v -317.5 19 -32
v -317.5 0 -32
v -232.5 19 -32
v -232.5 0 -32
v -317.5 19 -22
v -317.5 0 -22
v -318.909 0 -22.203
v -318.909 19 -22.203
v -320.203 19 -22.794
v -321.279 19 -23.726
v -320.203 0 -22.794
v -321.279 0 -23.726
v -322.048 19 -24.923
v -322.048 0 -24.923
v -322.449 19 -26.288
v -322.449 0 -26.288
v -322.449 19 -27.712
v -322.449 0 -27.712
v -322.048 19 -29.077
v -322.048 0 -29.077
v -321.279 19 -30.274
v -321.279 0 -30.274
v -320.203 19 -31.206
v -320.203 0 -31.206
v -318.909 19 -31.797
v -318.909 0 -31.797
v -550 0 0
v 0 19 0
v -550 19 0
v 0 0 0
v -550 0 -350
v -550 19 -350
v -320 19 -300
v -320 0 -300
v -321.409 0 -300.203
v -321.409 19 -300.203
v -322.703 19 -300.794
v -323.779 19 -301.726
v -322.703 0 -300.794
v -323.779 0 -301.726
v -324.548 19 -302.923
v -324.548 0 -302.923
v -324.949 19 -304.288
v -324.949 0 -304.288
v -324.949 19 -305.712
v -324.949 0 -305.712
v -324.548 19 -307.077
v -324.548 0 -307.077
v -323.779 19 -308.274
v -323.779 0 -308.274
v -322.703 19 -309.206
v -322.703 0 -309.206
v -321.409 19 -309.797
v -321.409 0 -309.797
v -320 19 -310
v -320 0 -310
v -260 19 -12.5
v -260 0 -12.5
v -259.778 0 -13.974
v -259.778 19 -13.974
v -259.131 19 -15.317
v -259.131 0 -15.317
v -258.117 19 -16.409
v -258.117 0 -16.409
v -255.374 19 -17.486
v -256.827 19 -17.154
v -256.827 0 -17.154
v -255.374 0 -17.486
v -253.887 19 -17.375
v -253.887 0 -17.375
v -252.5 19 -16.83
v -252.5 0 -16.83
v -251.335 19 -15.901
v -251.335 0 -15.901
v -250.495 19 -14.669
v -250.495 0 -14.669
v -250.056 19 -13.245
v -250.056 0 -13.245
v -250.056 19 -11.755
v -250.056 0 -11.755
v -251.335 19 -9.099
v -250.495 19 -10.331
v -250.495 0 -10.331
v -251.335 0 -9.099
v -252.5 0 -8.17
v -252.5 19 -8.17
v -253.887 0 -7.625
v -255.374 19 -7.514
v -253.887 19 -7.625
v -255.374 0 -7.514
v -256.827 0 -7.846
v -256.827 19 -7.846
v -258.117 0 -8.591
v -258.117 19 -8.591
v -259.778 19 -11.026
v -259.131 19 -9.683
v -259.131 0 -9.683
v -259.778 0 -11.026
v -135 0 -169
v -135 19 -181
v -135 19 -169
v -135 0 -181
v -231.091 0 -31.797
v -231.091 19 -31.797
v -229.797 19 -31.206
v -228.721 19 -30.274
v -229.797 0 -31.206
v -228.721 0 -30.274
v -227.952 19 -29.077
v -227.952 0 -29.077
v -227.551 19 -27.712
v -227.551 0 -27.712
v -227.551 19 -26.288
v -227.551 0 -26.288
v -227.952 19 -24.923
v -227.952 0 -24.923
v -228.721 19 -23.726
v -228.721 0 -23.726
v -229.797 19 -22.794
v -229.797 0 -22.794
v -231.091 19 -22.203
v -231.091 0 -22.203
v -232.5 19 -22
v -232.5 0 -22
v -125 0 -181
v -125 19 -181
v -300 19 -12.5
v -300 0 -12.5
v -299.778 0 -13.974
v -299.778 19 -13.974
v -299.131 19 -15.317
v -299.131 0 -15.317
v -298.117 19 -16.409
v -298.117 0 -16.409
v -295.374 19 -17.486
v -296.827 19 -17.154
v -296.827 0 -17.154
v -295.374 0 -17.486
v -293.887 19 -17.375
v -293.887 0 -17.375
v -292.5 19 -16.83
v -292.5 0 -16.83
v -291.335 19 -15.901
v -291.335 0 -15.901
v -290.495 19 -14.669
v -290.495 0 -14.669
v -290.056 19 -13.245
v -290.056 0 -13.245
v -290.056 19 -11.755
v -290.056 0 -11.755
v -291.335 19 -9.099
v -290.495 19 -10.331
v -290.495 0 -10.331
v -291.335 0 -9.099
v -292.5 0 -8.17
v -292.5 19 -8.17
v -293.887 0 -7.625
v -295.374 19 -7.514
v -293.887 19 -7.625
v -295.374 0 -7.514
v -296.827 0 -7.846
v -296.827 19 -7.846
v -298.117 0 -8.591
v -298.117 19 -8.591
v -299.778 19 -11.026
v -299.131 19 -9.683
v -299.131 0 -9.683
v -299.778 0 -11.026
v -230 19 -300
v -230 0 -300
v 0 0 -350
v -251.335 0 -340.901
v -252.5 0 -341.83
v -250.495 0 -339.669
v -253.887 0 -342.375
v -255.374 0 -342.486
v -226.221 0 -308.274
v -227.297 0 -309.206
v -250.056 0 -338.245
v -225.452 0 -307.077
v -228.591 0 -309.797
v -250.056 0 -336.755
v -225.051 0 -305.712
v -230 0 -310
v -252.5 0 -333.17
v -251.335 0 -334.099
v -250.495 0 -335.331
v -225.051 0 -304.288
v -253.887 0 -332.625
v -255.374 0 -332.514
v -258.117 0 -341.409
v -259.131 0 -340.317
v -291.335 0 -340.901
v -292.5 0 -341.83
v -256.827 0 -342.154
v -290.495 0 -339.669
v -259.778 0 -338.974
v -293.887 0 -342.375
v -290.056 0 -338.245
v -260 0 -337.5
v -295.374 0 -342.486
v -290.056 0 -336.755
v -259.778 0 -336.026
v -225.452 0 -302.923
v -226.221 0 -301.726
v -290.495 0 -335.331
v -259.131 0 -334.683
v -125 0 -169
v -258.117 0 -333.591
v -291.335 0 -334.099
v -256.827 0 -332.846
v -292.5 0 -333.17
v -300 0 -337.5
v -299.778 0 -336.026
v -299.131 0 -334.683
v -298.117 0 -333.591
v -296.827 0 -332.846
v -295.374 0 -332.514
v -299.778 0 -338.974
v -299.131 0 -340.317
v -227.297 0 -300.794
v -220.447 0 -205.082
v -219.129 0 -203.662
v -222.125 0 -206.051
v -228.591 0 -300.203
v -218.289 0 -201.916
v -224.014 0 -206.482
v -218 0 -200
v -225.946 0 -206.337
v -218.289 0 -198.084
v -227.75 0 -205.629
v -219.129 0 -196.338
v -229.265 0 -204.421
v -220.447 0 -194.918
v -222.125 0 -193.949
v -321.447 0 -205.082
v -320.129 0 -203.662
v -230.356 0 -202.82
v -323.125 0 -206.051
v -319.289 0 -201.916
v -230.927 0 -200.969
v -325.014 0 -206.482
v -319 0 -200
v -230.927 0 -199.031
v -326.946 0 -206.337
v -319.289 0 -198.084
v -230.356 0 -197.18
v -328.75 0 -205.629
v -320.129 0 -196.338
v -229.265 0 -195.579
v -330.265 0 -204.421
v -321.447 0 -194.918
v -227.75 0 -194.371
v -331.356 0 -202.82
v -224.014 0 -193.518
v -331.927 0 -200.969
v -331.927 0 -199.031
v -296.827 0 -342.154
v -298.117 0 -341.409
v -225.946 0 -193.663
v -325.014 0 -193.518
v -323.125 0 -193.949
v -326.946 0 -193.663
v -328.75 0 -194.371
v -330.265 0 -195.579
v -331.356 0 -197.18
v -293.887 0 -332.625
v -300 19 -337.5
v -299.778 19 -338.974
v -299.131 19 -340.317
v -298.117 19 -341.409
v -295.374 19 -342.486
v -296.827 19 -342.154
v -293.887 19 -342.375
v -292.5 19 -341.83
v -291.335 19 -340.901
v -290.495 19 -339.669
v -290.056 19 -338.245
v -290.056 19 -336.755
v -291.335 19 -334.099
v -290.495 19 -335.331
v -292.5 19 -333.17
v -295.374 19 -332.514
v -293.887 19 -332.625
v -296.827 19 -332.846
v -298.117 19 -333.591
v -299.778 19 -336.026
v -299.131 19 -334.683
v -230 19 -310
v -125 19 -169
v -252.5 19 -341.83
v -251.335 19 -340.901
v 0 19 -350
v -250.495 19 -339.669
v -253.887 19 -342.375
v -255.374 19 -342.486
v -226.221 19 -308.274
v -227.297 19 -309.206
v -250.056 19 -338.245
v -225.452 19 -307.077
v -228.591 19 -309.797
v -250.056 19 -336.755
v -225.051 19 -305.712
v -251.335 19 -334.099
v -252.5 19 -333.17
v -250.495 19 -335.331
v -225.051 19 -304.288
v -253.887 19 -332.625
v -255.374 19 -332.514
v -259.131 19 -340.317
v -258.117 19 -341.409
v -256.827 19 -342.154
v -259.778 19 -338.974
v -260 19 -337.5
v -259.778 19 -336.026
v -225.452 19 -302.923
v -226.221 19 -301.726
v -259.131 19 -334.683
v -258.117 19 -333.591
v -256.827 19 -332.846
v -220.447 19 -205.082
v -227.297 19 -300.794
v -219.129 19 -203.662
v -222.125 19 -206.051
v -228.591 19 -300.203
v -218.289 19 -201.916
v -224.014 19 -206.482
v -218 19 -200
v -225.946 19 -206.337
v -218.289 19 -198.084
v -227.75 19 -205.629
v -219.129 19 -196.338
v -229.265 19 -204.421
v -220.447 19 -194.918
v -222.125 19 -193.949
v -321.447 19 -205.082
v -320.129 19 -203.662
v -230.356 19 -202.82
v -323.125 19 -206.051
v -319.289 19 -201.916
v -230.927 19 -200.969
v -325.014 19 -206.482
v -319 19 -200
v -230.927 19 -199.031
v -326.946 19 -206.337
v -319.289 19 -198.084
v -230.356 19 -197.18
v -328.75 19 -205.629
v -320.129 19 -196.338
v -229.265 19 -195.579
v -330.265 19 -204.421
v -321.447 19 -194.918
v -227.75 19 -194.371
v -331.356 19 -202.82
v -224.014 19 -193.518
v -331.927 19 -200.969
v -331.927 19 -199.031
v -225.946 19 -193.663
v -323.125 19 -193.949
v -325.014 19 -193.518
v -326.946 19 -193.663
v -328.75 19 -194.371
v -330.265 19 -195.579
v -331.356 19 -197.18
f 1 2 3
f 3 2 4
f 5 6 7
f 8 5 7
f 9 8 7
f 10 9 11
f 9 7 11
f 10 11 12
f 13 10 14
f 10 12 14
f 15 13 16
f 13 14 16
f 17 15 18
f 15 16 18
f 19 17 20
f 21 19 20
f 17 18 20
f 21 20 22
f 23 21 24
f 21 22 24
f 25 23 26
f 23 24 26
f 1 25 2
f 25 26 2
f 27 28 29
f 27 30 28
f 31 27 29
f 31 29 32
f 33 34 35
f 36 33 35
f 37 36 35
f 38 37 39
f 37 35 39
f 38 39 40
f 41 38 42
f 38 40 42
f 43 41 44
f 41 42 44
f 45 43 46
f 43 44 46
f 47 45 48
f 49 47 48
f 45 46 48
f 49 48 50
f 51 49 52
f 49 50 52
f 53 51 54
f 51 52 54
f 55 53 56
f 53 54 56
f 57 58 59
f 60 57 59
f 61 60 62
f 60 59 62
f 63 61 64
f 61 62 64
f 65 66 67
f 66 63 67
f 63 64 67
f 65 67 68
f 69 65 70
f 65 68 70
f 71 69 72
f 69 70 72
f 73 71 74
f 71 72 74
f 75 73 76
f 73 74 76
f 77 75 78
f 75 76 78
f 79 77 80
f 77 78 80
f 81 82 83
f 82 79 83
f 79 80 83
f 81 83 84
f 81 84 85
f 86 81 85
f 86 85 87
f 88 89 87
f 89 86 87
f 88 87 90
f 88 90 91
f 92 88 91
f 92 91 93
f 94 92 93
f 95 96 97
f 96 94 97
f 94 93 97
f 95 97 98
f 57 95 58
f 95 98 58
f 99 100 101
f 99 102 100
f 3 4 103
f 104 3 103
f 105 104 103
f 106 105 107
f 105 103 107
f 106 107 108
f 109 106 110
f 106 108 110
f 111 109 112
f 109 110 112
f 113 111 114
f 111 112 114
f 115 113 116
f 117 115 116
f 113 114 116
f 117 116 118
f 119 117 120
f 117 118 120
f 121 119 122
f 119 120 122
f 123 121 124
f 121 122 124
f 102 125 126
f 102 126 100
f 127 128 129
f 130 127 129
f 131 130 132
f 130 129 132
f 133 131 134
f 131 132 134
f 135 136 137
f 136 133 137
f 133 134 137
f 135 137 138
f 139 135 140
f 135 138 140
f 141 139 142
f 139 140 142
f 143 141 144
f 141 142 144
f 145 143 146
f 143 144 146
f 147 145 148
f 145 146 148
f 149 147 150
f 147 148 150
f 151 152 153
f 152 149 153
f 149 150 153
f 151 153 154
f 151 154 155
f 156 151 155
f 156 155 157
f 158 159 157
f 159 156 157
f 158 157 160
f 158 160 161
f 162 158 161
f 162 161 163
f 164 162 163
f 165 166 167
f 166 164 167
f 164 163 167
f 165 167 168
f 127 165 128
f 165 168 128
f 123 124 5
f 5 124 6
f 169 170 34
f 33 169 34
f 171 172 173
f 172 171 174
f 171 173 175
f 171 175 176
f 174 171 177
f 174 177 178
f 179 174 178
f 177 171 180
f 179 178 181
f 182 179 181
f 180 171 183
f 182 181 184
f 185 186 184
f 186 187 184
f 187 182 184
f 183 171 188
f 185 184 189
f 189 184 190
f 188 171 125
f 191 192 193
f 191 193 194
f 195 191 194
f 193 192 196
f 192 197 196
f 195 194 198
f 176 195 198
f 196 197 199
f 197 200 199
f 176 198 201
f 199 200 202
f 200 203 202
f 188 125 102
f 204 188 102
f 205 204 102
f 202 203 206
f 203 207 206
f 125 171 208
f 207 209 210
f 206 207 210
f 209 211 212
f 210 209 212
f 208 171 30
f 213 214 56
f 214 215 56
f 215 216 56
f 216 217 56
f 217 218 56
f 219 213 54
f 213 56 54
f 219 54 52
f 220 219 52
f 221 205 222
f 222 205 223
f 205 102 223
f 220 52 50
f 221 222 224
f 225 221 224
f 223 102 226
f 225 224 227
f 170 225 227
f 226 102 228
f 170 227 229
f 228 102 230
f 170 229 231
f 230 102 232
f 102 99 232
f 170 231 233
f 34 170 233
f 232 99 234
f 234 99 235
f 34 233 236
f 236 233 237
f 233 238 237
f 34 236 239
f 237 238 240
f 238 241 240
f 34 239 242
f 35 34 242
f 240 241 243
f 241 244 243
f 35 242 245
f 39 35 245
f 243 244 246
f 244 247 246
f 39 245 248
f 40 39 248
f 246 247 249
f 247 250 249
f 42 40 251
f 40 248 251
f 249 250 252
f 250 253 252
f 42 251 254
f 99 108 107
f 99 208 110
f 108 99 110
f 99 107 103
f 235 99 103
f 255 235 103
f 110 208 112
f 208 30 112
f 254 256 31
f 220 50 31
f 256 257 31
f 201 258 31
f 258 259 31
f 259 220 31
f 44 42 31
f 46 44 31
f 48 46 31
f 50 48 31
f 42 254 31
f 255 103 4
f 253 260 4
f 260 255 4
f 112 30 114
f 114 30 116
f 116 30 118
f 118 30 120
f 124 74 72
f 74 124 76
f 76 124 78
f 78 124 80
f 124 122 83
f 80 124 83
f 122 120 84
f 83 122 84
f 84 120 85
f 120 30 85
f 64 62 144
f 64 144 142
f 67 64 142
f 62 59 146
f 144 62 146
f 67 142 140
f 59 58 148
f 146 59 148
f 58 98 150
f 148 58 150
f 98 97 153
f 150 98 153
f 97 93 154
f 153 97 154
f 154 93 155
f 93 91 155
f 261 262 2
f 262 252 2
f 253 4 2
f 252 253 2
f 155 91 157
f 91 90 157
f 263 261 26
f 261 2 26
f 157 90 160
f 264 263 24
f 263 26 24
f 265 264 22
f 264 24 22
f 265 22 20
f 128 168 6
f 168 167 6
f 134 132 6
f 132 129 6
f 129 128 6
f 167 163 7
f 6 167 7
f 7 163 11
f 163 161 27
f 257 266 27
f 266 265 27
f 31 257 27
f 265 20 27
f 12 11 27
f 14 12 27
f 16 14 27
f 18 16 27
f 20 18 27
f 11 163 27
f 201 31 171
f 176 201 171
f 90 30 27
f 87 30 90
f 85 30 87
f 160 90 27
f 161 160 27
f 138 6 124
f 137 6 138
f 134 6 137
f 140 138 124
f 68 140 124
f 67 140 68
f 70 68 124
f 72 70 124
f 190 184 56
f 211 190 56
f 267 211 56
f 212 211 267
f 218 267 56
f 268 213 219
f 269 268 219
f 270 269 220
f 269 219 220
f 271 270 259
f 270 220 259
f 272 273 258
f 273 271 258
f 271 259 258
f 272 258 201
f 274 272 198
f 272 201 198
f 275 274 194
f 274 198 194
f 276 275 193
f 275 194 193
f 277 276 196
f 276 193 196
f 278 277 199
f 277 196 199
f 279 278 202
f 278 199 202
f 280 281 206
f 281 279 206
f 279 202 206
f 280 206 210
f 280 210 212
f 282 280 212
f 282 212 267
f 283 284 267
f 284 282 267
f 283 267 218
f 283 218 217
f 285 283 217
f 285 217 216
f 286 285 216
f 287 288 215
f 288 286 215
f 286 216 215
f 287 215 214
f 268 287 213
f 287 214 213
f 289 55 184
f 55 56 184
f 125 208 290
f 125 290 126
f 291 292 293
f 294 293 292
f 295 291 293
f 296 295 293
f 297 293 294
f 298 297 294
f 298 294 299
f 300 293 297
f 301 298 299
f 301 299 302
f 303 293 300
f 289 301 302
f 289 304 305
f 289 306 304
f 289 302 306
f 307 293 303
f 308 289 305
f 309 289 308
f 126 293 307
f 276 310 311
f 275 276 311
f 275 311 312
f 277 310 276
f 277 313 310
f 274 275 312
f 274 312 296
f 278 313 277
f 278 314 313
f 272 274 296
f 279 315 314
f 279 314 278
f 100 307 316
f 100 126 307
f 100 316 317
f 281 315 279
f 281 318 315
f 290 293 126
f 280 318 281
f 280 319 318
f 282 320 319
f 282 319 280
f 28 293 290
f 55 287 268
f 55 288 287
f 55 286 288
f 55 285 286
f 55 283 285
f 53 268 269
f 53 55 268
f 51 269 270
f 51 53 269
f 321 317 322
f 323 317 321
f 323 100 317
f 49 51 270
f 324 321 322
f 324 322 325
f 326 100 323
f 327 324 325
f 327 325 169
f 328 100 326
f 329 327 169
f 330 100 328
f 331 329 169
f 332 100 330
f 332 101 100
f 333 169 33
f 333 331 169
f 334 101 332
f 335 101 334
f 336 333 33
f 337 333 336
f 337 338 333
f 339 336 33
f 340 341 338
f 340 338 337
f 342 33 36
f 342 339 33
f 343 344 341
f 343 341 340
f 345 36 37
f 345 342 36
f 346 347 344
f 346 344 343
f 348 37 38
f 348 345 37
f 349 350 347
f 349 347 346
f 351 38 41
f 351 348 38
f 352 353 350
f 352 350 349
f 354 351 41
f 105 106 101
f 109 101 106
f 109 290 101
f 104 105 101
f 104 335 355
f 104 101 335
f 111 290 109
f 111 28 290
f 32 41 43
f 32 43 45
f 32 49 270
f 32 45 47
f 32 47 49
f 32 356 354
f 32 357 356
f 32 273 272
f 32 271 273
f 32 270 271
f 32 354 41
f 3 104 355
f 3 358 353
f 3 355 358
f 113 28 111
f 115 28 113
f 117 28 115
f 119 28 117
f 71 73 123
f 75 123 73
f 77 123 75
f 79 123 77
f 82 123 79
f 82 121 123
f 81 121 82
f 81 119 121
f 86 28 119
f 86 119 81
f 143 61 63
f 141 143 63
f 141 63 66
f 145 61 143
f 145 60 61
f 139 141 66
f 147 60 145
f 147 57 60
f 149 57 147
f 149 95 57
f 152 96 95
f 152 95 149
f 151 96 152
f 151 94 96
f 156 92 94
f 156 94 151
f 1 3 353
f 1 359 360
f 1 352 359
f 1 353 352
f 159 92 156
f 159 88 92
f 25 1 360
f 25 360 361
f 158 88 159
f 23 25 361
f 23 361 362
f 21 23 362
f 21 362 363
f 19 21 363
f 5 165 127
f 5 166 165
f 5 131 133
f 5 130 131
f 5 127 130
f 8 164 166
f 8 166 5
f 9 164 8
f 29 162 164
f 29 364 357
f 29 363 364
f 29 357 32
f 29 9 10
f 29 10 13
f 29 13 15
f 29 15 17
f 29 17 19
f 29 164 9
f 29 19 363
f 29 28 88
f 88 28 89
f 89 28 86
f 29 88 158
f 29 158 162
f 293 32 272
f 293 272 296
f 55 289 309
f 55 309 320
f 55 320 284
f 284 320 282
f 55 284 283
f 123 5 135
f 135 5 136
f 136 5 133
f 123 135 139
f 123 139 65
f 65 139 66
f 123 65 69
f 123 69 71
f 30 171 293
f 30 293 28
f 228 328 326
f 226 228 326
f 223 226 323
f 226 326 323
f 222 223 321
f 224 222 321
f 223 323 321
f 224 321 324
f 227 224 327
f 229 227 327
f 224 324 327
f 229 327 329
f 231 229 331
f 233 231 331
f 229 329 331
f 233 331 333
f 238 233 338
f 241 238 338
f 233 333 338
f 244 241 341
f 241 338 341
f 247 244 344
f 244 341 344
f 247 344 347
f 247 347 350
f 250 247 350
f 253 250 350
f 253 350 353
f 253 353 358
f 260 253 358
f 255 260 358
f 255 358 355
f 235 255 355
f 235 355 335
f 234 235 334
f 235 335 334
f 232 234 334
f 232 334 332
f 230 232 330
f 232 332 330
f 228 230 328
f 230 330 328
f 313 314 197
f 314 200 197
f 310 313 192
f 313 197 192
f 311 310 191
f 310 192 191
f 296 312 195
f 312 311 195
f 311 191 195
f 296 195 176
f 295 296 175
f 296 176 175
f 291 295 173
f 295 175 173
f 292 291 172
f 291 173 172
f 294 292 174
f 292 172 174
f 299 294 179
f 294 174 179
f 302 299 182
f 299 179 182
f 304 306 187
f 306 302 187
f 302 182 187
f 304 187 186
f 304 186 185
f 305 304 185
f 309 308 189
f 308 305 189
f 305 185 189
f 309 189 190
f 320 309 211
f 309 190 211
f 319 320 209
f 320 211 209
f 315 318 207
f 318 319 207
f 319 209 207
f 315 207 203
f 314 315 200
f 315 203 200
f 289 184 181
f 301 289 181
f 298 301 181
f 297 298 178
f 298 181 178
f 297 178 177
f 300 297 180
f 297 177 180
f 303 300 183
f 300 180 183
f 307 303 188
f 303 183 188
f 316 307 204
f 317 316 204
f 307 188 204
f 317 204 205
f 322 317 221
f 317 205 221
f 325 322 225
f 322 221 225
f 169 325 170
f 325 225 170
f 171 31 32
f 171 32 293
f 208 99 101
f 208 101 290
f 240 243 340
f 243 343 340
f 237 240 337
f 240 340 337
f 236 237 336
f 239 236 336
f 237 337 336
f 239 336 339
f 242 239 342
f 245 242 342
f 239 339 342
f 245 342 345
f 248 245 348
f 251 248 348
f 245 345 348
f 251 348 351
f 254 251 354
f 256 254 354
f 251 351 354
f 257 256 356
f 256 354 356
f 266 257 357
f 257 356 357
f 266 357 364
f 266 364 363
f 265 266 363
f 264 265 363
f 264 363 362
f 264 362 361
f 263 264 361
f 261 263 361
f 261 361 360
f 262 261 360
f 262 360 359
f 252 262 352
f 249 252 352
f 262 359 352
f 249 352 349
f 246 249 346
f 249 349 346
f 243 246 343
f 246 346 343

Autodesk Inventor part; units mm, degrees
ref_plane "YZ Plane" through (0, 0, 0) normal (1, 0, 0) x (0, 1, 0)
ref_plane "XZ Plane" through (0, 0, 0) normal (0, 1, 0) x (-1, 0, 0)
ref_plane "XY Plane" through (0, 0, 0) normal (0, 0, 1) x (1, 0, 0)
sketch "Boceto1" plane through (0, 0, 0) normal (0, 1, 0) x (-1, 0, 0)
  line L0 (0, 0) -> (550, 0)
  line L1 (550, 0) -> (550, -350)
  line L2 (550, -350) -> (0, -350)
  line L3 (0, -350) -> (0, 0)
  line L4 (0, -175) -> (550, -175) construction
  line L5 (275, -350) -> (275, 0) construction
  circle A0 centre (255, -12.5) radius 5
  circle A1 centre (295, -12.5) radius 5
  circle A2 centre (255, -337.5) radius 5
  circle A3 centre (295, -337.5) radius 5
  dimension "d0" = 350
  dimension "d1" = 550
  dimension "d83" = 12.5
  dimension "d84" = 10
  dimension "d85" = 20
  dimension "d88" = 40
  dimension "d95" = 325
extrude "Extrusión10" add sketch "Boceto1" along normal blind 19
sketch "Boceto8" plane through (0, 19, 0) normal (0, 1, 0) x (1, 0, 0)
  line L0 (-550, 0) -> (0, 0) construction
  line L1 (-275, 0) -> (-275, 350) construction
  line L2 (0, 350) -> (-550, 350) construction
  circle A0 centre (-224.5, 200) radius 6.5
  circle A1 centre (-325.5, 200) radius 6.5
  dimension "d102" = 101
  dimension "d103" = 50.5
  dimension "d104" = 13
  dimension "d116" = 150
extrude "Extrusión11" cut sketch "Boceto8" against normal through all
sketch "Boceto9" plane through (0, 0, 0) normal (0, -1, 0) x (1, 0, 0)
  line L0 (0, -305) -> (-550, -305) construction
  line L1 (-550, -350) -> (-550, 0) construction
  line L2 (0, -350) -> (-550, -350) construction
  line L3 (-230, -305) -> (-320, -305) construction
  line L4 (-230, -300) -> (-320, -300)
  line L5 (-320, -310) -> (-230, -310)
  arc A0 (-230, -310) -> (-230, -300) centre (-230, -305) ccw
  arc A1 (-320, -300) -> (-320, -310) centre (-320, -305) ccw
  line L6 (0, 0) -> (0, -350) construction
  line L7 (0, 0) -> (0, -350) projected
  line L8 (0, -27) -> (-550, -27) construction
  line L9 (-550, 0) -> (0, 0) projected
  line L10 (-232.5, -27) -> (-317.5, -27) construction
  line L11 (-232.5, -22) -> (-317.5, -22)
  line L12 (-317.5, -32) -> (-232.5, -32)
  arc A2 (-232.5, -32) -> (-232.5, -22) centre (-232.5, -27) ccw
  arc A3 (-317.5, -22) -> (-317.5, -32) centre (-317.5, -27) ccw
  point P0 (-275, -305)
  point P1 (-275, -305)
  point P2 (-275, -27)
  point P3 (-275, -27)
  dimension "d108" = 45
  dimension "d109" = 10
  dimension "d110" = 90
  dimension "d111" = 27
  dimension "d112" = 10
  dimension "d113" = 85
extrude "Extrusión12" cut sketch "Boceto9" against normal through all
sketch "Sketch10" plane through (0, 0, 0) normal (0, -1, 0) x (1, 0, 0)
  line L0 (-135, -169) -> (-125, -169)
  line L1 (-125, -169) -> (-125, -181)
  line L2 (-125, -181) -> (-135, -181)
  line L3 (-135, -181) -> (-135, -169)
  circle A0 centre (-295, -337.5) radius 5 projected
  line L4 (-550, -350) -> (-550, 0) projected
  circle A1 centre (-255, -337.5) radius 5 projected
  point P0 (0, 0)
  point P1 (-135, -175)
  point P2 (-550, -175)
  dimension "d117" = 10
  dimension "d118" = 12
  dimension "d122" = 120
extrude "Extrusion13" cut sketch "Sketch10" against normal through all contours L0 L1 L2 L3
properties part number "mesa" material "MDF Tablero de fibras de densidad media"
